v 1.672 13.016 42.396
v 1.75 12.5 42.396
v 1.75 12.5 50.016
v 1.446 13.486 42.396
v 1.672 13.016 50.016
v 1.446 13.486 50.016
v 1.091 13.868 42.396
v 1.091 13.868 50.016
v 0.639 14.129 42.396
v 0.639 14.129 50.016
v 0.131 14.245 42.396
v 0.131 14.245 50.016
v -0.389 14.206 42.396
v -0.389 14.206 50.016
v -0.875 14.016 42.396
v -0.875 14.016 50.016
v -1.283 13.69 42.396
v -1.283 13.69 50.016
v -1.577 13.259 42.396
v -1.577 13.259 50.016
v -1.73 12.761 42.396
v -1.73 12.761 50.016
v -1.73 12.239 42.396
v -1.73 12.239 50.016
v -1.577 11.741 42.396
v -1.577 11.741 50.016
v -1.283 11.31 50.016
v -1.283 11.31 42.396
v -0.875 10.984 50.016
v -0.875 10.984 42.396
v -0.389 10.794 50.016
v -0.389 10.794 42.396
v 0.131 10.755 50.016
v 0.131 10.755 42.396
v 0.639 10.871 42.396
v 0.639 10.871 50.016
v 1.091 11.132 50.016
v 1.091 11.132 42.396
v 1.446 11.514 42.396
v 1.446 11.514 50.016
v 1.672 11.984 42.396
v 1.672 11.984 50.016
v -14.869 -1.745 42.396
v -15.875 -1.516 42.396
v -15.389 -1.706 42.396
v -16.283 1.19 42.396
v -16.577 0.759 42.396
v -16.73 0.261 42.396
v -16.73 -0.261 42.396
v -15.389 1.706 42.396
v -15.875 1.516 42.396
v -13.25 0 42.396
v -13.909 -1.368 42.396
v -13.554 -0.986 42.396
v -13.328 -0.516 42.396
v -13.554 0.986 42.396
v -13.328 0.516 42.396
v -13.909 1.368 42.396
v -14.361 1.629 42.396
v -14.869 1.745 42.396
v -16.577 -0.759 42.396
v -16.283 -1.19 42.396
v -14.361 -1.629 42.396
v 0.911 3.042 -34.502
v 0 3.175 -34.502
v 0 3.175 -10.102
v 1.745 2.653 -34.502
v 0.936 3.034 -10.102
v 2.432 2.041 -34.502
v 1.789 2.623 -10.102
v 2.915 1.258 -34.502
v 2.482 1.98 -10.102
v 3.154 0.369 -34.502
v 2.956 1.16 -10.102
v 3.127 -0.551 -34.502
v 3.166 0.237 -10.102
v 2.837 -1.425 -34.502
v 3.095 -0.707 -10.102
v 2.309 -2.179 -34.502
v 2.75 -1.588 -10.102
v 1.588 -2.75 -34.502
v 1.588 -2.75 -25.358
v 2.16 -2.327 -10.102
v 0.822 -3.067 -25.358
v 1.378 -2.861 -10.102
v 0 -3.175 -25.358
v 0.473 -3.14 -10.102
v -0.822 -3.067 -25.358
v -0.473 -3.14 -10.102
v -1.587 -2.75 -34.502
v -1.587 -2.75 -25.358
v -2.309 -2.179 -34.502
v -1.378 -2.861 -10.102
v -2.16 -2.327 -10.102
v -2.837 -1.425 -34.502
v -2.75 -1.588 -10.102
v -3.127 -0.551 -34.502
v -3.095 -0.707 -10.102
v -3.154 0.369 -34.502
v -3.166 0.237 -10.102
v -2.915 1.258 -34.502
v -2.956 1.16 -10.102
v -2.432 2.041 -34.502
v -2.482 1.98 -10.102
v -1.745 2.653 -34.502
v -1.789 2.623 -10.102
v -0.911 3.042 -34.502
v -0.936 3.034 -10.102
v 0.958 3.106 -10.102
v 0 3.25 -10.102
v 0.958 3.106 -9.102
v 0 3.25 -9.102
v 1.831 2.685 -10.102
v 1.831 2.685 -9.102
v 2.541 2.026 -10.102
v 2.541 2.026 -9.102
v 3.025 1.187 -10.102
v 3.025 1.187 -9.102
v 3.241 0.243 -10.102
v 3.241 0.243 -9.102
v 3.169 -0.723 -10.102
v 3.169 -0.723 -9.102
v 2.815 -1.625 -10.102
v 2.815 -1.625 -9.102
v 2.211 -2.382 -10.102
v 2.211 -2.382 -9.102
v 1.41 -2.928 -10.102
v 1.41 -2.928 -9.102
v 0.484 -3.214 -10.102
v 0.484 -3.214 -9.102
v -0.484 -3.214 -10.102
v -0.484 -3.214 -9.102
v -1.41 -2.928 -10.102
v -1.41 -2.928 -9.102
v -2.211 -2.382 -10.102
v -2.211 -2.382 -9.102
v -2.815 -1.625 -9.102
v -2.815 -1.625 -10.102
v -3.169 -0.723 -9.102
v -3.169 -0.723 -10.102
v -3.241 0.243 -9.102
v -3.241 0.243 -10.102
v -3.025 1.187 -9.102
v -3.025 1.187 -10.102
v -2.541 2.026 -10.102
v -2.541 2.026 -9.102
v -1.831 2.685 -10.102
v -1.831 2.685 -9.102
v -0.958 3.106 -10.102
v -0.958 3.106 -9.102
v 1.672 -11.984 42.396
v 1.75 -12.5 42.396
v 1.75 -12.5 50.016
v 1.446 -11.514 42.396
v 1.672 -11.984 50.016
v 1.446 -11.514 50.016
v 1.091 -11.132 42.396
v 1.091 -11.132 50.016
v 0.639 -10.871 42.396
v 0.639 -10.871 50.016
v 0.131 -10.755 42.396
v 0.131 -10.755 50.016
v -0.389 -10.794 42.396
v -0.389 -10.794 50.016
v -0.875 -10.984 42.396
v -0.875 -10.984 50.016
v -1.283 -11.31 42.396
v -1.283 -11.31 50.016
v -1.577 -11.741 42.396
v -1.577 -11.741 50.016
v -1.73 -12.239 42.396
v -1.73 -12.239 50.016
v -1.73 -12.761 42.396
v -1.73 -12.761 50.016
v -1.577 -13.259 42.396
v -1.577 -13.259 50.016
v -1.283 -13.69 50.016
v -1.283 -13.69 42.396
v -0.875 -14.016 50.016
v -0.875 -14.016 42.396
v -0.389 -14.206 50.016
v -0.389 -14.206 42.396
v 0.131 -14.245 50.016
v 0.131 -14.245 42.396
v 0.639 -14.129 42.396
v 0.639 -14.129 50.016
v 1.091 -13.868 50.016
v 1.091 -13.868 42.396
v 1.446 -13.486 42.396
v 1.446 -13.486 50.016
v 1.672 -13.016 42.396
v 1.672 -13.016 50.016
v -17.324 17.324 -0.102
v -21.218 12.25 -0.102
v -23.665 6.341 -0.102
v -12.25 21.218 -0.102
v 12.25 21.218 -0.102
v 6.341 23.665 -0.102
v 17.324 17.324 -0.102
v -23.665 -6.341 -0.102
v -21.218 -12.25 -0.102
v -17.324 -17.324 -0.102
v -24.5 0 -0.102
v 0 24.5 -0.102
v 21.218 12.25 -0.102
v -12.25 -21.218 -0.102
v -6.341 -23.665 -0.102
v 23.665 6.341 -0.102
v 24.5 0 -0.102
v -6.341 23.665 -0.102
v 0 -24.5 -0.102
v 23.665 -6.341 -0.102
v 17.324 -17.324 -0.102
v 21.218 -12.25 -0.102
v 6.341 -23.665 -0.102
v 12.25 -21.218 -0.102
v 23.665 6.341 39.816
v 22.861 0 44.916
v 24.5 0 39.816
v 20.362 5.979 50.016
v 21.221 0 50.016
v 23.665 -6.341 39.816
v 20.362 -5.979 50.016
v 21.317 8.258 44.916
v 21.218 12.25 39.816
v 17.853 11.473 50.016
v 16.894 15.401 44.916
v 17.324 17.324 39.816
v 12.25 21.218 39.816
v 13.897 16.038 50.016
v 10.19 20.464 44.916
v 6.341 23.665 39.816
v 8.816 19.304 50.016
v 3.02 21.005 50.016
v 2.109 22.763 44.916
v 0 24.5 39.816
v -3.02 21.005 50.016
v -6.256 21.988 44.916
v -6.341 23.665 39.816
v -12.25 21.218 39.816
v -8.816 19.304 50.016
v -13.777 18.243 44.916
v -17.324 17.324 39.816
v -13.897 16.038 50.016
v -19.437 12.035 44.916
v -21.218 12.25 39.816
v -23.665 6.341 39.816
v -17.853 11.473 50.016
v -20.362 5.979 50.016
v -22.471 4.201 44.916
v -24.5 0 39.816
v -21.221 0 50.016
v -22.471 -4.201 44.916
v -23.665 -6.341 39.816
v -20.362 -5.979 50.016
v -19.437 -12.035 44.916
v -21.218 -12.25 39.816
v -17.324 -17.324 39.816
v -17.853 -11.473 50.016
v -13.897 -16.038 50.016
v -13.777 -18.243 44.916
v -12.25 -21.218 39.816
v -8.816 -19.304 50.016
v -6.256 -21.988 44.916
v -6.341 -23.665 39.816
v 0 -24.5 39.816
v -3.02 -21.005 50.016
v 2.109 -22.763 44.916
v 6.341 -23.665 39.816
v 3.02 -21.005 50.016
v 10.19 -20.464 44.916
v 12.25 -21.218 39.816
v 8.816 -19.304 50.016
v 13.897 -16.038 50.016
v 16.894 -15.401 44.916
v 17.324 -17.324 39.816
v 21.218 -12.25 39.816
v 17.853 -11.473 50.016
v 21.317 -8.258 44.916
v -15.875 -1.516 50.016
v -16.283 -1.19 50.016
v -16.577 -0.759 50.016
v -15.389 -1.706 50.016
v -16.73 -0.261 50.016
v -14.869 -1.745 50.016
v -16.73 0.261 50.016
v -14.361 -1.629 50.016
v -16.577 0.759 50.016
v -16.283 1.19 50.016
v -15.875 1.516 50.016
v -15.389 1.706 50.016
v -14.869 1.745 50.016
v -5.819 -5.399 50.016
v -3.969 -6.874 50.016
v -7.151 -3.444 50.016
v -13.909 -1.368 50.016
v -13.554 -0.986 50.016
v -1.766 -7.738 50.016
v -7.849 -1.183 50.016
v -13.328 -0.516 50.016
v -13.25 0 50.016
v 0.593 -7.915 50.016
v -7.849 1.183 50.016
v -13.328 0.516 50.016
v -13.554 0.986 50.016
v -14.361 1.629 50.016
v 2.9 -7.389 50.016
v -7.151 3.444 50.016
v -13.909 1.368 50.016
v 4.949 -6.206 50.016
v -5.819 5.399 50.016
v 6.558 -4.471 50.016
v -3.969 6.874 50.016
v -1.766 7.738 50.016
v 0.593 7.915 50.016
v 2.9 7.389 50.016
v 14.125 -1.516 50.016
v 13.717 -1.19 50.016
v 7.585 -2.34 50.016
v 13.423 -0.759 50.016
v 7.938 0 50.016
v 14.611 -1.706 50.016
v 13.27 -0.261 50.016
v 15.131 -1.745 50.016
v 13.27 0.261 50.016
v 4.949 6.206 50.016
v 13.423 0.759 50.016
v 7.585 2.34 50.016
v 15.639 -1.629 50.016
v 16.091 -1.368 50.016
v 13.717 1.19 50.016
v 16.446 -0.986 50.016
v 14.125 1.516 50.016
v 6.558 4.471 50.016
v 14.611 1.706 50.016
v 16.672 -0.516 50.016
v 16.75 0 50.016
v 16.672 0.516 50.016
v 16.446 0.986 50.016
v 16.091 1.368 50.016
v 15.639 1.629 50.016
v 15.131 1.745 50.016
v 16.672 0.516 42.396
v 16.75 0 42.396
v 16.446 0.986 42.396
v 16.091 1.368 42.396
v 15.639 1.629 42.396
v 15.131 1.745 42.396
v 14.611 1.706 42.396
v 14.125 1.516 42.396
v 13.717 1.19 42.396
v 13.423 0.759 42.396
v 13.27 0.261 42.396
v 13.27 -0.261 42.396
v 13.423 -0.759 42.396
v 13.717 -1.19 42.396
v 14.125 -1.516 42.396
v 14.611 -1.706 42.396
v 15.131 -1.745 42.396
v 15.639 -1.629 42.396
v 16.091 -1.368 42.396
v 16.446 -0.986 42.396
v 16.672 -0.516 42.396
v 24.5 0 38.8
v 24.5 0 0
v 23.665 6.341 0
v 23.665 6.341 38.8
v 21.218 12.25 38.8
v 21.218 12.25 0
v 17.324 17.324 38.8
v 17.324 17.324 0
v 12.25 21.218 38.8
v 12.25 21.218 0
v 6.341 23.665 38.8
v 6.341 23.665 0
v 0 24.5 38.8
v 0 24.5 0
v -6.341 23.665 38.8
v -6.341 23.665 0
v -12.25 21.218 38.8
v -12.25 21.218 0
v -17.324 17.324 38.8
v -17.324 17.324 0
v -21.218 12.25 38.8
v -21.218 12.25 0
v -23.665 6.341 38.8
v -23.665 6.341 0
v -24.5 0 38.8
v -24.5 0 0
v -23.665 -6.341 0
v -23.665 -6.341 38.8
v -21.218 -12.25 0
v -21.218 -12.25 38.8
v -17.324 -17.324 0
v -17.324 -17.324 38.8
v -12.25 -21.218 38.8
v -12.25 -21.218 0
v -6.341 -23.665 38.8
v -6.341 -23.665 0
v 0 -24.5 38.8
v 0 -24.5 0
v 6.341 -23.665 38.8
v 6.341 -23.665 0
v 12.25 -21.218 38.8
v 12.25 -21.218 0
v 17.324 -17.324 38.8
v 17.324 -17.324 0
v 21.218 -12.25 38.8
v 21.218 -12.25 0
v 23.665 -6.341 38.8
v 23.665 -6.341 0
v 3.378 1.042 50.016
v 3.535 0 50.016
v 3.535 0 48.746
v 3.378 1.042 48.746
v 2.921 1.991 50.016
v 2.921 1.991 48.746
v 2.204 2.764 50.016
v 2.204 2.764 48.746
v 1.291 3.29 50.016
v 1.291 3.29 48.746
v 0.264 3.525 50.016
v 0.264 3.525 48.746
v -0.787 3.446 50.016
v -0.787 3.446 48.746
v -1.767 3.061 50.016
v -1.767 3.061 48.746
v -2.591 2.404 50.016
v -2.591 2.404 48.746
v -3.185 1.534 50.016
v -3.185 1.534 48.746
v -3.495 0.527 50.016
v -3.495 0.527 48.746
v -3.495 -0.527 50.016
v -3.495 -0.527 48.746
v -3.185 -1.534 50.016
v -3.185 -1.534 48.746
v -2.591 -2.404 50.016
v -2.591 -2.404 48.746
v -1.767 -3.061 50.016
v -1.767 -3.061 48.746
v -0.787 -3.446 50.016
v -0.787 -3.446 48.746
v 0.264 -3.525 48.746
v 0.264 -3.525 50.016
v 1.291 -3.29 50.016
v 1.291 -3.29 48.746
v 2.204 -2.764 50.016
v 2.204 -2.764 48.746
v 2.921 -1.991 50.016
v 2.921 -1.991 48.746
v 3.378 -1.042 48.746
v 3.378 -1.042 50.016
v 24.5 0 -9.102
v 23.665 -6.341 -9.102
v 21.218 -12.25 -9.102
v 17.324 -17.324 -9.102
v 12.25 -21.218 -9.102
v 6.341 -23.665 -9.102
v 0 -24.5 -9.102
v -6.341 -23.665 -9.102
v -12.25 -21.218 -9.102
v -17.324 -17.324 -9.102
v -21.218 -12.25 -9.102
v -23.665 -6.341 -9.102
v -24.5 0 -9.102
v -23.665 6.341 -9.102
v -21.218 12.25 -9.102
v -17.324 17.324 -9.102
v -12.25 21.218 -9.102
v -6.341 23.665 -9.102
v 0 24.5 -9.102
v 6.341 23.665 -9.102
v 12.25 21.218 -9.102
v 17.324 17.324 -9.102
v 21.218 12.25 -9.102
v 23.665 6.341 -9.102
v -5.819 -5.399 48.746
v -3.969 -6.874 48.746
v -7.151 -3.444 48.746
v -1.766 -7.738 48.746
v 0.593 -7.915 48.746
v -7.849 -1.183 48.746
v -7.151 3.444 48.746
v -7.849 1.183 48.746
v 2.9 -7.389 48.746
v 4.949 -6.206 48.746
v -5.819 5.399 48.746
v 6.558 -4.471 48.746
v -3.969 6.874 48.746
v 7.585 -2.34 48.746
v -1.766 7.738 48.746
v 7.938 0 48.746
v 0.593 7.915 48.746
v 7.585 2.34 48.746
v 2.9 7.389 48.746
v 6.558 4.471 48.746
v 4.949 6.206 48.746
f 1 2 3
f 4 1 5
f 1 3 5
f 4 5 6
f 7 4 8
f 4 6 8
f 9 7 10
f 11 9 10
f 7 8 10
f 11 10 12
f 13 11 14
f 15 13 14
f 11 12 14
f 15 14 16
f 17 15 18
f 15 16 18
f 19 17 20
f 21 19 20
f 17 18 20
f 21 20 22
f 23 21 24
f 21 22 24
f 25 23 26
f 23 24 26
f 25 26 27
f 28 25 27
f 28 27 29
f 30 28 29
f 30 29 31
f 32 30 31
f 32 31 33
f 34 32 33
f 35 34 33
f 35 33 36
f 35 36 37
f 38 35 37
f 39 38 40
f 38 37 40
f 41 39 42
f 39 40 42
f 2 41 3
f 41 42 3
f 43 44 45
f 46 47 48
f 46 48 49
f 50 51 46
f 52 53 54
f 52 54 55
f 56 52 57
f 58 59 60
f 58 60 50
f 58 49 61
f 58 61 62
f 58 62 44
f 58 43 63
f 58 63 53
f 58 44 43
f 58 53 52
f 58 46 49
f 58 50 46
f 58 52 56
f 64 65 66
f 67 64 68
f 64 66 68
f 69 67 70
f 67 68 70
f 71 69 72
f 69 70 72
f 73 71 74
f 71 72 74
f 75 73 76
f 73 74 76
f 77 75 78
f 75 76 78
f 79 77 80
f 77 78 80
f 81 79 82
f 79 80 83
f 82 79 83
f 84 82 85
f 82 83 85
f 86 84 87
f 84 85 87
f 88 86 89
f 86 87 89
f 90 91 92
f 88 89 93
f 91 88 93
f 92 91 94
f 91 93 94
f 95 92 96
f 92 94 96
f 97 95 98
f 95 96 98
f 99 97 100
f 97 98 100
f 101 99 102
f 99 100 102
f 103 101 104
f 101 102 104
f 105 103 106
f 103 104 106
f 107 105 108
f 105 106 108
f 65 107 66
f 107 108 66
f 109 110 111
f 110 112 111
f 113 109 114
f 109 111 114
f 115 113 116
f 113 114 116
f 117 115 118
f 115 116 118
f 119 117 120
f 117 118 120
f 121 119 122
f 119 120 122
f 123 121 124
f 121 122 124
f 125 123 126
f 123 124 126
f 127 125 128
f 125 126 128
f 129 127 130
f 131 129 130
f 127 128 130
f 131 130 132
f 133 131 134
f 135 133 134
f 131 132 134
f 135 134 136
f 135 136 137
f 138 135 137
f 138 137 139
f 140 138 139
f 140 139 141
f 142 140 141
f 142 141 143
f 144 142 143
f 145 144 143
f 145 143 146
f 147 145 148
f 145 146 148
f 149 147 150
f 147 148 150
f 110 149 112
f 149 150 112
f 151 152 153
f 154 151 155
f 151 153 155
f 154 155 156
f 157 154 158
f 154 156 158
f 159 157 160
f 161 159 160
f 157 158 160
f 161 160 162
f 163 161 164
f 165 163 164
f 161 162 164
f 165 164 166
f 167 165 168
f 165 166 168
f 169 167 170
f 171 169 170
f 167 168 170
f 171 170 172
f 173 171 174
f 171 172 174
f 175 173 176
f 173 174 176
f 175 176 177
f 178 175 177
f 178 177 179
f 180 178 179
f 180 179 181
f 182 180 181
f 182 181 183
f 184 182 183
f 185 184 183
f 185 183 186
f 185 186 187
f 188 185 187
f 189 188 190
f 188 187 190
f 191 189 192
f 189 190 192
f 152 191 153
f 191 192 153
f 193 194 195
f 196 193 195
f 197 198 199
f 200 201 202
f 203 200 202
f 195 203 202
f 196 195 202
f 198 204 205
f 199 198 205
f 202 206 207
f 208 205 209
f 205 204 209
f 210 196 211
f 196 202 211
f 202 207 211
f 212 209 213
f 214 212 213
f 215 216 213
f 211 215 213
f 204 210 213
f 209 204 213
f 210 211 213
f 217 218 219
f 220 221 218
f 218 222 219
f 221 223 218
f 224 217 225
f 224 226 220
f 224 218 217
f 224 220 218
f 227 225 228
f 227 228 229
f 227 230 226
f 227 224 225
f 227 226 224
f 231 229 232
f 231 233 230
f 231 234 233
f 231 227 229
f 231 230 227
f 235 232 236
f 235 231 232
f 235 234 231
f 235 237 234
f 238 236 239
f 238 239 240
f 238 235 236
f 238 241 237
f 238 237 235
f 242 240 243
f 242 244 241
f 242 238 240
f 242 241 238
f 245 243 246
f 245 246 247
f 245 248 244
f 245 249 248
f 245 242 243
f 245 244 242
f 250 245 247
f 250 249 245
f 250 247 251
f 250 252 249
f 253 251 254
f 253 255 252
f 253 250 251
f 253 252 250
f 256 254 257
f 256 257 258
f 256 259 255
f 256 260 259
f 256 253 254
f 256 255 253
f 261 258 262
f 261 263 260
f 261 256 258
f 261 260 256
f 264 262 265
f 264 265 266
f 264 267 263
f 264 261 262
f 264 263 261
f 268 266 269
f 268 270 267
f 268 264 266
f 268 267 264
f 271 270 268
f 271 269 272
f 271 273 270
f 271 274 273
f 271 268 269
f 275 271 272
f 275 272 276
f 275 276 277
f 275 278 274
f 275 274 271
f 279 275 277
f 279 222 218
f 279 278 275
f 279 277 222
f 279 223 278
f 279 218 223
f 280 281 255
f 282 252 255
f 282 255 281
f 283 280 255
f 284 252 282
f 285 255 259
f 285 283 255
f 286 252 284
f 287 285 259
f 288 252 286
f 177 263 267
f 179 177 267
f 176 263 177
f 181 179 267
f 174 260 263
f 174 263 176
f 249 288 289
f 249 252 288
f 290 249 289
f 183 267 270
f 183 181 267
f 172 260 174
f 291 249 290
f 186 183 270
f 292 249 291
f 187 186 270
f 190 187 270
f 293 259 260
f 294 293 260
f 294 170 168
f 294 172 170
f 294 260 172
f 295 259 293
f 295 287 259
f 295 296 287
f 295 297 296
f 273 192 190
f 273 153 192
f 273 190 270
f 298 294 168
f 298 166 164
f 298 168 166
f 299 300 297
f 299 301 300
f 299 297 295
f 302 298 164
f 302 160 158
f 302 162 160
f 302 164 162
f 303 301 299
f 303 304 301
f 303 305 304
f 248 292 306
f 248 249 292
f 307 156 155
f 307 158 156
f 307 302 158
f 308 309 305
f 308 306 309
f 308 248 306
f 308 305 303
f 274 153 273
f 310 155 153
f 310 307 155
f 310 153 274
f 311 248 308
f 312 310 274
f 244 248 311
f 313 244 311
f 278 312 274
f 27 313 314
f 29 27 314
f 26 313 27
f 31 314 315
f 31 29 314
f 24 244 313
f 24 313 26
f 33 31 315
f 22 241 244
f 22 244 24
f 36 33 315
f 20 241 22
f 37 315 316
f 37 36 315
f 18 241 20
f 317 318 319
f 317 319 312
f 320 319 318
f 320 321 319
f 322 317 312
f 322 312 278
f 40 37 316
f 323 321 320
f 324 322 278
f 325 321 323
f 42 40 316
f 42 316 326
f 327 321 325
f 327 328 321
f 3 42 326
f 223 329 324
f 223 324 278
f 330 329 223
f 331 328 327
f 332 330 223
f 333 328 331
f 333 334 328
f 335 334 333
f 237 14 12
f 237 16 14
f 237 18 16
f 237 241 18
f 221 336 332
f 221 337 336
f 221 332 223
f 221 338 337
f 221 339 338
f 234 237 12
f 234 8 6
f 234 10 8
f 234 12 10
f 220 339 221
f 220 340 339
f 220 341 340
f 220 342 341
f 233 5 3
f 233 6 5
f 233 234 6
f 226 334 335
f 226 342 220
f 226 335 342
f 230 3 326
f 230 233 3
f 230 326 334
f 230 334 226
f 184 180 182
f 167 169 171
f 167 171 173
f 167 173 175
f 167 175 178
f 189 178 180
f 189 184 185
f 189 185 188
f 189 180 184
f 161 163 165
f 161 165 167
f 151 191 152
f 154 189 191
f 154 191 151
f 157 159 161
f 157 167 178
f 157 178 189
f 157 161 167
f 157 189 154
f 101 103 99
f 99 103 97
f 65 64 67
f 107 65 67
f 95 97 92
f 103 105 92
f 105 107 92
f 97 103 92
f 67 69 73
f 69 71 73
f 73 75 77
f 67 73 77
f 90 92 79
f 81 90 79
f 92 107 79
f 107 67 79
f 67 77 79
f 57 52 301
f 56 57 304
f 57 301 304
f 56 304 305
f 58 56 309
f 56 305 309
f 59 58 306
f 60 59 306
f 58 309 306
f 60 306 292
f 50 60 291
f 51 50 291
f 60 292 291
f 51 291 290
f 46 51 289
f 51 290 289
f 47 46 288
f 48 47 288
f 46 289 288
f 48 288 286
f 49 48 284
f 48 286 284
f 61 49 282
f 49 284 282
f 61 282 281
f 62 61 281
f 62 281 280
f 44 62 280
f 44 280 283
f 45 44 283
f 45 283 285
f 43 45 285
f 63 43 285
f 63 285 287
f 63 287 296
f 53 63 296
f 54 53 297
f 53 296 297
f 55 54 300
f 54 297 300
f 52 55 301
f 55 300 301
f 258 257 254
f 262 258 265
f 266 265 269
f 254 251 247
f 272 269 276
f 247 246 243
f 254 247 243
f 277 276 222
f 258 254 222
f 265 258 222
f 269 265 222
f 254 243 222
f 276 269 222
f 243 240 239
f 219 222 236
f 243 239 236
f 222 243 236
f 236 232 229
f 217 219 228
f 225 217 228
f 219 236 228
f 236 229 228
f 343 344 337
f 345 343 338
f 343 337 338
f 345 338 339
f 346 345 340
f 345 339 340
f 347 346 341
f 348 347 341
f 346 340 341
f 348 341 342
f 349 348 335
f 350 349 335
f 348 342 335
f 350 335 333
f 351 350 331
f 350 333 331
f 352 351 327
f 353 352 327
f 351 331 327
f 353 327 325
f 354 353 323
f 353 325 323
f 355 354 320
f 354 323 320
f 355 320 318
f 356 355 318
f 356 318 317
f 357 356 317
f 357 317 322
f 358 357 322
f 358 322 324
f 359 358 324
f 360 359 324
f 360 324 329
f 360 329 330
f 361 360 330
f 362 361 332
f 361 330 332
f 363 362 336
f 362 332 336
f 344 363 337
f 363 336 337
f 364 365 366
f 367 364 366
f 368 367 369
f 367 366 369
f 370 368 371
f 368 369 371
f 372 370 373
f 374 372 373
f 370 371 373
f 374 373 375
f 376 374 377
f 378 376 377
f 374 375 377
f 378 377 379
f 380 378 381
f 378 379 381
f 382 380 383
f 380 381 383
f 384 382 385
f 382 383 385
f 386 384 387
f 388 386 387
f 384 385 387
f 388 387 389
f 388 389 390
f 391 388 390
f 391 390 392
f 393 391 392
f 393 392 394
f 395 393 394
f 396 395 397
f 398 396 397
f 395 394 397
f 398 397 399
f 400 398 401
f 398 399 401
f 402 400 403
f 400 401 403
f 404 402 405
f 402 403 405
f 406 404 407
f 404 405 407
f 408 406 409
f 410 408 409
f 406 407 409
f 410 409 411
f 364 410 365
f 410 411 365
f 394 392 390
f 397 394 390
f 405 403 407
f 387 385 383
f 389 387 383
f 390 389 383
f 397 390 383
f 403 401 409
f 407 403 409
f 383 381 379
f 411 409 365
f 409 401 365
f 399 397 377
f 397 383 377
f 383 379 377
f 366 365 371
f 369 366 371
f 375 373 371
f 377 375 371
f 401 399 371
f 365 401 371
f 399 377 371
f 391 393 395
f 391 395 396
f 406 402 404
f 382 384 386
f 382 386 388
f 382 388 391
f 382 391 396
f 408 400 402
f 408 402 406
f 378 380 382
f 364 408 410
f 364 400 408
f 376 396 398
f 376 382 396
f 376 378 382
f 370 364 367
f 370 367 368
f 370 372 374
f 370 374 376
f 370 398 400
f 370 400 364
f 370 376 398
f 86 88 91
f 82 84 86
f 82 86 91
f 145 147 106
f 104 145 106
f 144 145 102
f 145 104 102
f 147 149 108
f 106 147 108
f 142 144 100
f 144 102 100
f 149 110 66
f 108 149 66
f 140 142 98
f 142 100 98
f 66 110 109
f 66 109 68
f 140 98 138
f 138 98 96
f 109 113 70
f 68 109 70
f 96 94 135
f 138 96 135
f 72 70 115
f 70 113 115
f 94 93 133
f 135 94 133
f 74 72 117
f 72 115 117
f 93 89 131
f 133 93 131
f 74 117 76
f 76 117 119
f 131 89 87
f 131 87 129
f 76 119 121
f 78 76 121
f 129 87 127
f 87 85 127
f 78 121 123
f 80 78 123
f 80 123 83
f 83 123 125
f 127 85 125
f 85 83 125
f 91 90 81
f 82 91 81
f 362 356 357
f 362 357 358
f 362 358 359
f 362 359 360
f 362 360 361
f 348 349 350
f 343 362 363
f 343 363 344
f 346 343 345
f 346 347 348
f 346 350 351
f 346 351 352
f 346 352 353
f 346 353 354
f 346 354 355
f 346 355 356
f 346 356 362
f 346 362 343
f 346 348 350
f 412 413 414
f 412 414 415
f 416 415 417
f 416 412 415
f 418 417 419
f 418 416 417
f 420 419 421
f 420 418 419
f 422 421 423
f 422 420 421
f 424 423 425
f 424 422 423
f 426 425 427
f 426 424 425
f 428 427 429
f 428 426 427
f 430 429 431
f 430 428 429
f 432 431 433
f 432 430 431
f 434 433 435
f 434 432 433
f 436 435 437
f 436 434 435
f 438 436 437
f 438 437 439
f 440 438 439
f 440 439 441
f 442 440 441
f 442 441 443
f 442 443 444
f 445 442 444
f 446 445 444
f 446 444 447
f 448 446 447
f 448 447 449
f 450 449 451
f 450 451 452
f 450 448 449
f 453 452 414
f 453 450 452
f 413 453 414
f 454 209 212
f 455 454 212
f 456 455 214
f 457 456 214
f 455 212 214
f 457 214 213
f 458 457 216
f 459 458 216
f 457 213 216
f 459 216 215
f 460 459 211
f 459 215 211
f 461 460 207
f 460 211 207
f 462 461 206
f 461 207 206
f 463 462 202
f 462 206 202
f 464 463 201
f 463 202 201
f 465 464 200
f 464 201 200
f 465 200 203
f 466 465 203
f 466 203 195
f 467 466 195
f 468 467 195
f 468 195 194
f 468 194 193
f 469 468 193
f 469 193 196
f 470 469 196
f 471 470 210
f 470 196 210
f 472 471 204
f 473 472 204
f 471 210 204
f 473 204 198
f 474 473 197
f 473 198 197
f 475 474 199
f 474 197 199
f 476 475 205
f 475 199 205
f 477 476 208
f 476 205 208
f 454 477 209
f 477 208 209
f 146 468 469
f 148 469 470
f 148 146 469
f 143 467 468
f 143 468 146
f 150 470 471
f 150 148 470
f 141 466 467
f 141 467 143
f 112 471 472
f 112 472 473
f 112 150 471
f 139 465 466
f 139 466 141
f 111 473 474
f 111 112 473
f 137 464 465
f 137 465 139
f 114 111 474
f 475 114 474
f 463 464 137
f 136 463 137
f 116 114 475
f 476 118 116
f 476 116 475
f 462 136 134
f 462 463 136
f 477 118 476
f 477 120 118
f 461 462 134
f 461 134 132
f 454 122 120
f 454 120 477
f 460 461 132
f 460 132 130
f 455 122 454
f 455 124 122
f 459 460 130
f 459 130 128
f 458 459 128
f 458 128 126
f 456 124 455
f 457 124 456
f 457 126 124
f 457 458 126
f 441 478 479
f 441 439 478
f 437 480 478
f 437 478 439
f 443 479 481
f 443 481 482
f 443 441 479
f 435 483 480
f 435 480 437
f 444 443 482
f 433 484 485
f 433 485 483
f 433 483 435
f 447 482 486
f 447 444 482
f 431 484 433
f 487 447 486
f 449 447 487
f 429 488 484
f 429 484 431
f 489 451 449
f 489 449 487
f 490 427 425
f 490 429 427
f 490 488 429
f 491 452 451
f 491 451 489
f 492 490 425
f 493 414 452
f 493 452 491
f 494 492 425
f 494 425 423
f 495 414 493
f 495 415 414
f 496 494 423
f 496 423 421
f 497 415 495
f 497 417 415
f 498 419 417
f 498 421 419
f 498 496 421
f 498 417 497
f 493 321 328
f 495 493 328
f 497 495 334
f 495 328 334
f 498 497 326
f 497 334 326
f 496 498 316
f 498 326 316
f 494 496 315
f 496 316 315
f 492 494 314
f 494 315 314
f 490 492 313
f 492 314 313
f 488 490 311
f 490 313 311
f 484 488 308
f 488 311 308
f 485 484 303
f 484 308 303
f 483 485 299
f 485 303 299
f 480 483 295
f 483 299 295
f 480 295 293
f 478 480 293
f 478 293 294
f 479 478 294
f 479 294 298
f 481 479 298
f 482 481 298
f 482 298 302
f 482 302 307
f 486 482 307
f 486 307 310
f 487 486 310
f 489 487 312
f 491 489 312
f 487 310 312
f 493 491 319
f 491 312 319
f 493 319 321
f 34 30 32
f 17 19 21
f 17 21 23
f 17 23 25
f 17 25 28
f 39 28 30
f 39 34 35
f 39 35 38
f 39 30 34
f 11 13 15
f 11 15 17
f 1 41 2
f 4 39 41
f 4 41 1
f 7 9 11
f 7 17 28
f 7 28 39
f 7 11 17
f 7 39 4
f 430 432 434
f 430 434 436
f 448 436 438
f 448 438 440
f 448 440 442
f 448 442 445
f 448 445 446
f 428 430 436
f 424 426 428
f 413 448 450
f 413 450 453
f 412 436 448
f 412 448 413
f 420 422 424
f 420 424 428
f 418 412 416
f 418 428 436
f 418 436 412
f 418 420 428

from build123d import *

# Parameters (mm, degrees)
F0_R      = 24.5
F1_DEPTH  = 38.8
F3_R      = 24.5
F4_DEPTH  = 9
F6_R      = 24.5
F8_R      = 21.221318
F10_R     = 7.9375
F10_R_2   = 3.534785
F11_DEPTH = 1.27
F12_R     = 1.75
F13_DEPTH = 7.62
F17_DEPTH = 9.144


with BuildPart() as f1:
    # F0 (on Top) → F1 (new body)
    with BuildSketch(Plane.XY):
        Circle(F0_R)
    extrude(amount=F1_DEPTH)


with BuildPart() as f4:
    # F3 (on offset) → F4 (new body)
    with BuildSketch(Plane(origin=(0, 0, -0.1016), x_dir=(1, 0, 0), z_dir=(0, 0, -1))):
        Circle(F3_R)
    extrude(amount=F4_DEPTH)

    # F14 (on Right) → F15 (revolve)
    with BuildSketch(Plane.YZ):
        Polygon((3.25, -9.1016), (0, -9.1016), (0, -34.5016), (3.175, -34.5016), (3.175, -10.1016), (3.25, -10.1016), align=None)
    revolve(axis=Axis((0, 0, -21.8016), (0, 0, -1)))

    # F16 (on face) → F17 (cut)
    with BuildSketch(Plane(origin=(0, 0, -34.5016), x_dir=(1, 0, 0), z_dir=(0, 0, -1))):
        with BuildLine():
            ThreePointArc((1.5875, 2.749631), (0, 3.175), (-1.5875, 2.749631))
            Line((-1.5875, 2.749631), (1.5875, 2.749631))
        make_face()
    extrude(amount=-F17_DEPTH, mode=Mode.SUBTRACT)


with BuildPart() as f9:
    # F6 (on offset) → F9 section 0
    with BuildSketch(Plane.XY.offset(39.816)):
        Circle(F6_R)
    # F8 (on offset) → F9 section 1
    with BuildSketch(Plane.XY.offset(50.016)):
        Circle(F8_R)
    loft()

    # F10 (on face) → F11 (cut)
    with BuildSketch(Plane.XY.offset(50.016)):
        Circle(F10_R)
        Circle(F10_R_2, mode=Mode.SUBTRACT)
    extrude(amount=-F11_DEPTH, mode=Mode.SUBTRACT)

    # F12 (on face) → F13 (cut)
    with BuildSketch(Plane.XY.offset(50.016)):
        with Locations((0, 12.5)):
            Circle(F12_R)
        with Locations((0, -12.5)):
            Circle(F12_R)
        with Locations((15, 0)):
            Circle(F12_R)
        with Locations((-15, 0)):
            Circle(F12_R)
    extrude(amount=-F13_DEPTH, mode=Mode.SUBTRACT)


solid = Compound([f1.part, f4.part, f9.part])
